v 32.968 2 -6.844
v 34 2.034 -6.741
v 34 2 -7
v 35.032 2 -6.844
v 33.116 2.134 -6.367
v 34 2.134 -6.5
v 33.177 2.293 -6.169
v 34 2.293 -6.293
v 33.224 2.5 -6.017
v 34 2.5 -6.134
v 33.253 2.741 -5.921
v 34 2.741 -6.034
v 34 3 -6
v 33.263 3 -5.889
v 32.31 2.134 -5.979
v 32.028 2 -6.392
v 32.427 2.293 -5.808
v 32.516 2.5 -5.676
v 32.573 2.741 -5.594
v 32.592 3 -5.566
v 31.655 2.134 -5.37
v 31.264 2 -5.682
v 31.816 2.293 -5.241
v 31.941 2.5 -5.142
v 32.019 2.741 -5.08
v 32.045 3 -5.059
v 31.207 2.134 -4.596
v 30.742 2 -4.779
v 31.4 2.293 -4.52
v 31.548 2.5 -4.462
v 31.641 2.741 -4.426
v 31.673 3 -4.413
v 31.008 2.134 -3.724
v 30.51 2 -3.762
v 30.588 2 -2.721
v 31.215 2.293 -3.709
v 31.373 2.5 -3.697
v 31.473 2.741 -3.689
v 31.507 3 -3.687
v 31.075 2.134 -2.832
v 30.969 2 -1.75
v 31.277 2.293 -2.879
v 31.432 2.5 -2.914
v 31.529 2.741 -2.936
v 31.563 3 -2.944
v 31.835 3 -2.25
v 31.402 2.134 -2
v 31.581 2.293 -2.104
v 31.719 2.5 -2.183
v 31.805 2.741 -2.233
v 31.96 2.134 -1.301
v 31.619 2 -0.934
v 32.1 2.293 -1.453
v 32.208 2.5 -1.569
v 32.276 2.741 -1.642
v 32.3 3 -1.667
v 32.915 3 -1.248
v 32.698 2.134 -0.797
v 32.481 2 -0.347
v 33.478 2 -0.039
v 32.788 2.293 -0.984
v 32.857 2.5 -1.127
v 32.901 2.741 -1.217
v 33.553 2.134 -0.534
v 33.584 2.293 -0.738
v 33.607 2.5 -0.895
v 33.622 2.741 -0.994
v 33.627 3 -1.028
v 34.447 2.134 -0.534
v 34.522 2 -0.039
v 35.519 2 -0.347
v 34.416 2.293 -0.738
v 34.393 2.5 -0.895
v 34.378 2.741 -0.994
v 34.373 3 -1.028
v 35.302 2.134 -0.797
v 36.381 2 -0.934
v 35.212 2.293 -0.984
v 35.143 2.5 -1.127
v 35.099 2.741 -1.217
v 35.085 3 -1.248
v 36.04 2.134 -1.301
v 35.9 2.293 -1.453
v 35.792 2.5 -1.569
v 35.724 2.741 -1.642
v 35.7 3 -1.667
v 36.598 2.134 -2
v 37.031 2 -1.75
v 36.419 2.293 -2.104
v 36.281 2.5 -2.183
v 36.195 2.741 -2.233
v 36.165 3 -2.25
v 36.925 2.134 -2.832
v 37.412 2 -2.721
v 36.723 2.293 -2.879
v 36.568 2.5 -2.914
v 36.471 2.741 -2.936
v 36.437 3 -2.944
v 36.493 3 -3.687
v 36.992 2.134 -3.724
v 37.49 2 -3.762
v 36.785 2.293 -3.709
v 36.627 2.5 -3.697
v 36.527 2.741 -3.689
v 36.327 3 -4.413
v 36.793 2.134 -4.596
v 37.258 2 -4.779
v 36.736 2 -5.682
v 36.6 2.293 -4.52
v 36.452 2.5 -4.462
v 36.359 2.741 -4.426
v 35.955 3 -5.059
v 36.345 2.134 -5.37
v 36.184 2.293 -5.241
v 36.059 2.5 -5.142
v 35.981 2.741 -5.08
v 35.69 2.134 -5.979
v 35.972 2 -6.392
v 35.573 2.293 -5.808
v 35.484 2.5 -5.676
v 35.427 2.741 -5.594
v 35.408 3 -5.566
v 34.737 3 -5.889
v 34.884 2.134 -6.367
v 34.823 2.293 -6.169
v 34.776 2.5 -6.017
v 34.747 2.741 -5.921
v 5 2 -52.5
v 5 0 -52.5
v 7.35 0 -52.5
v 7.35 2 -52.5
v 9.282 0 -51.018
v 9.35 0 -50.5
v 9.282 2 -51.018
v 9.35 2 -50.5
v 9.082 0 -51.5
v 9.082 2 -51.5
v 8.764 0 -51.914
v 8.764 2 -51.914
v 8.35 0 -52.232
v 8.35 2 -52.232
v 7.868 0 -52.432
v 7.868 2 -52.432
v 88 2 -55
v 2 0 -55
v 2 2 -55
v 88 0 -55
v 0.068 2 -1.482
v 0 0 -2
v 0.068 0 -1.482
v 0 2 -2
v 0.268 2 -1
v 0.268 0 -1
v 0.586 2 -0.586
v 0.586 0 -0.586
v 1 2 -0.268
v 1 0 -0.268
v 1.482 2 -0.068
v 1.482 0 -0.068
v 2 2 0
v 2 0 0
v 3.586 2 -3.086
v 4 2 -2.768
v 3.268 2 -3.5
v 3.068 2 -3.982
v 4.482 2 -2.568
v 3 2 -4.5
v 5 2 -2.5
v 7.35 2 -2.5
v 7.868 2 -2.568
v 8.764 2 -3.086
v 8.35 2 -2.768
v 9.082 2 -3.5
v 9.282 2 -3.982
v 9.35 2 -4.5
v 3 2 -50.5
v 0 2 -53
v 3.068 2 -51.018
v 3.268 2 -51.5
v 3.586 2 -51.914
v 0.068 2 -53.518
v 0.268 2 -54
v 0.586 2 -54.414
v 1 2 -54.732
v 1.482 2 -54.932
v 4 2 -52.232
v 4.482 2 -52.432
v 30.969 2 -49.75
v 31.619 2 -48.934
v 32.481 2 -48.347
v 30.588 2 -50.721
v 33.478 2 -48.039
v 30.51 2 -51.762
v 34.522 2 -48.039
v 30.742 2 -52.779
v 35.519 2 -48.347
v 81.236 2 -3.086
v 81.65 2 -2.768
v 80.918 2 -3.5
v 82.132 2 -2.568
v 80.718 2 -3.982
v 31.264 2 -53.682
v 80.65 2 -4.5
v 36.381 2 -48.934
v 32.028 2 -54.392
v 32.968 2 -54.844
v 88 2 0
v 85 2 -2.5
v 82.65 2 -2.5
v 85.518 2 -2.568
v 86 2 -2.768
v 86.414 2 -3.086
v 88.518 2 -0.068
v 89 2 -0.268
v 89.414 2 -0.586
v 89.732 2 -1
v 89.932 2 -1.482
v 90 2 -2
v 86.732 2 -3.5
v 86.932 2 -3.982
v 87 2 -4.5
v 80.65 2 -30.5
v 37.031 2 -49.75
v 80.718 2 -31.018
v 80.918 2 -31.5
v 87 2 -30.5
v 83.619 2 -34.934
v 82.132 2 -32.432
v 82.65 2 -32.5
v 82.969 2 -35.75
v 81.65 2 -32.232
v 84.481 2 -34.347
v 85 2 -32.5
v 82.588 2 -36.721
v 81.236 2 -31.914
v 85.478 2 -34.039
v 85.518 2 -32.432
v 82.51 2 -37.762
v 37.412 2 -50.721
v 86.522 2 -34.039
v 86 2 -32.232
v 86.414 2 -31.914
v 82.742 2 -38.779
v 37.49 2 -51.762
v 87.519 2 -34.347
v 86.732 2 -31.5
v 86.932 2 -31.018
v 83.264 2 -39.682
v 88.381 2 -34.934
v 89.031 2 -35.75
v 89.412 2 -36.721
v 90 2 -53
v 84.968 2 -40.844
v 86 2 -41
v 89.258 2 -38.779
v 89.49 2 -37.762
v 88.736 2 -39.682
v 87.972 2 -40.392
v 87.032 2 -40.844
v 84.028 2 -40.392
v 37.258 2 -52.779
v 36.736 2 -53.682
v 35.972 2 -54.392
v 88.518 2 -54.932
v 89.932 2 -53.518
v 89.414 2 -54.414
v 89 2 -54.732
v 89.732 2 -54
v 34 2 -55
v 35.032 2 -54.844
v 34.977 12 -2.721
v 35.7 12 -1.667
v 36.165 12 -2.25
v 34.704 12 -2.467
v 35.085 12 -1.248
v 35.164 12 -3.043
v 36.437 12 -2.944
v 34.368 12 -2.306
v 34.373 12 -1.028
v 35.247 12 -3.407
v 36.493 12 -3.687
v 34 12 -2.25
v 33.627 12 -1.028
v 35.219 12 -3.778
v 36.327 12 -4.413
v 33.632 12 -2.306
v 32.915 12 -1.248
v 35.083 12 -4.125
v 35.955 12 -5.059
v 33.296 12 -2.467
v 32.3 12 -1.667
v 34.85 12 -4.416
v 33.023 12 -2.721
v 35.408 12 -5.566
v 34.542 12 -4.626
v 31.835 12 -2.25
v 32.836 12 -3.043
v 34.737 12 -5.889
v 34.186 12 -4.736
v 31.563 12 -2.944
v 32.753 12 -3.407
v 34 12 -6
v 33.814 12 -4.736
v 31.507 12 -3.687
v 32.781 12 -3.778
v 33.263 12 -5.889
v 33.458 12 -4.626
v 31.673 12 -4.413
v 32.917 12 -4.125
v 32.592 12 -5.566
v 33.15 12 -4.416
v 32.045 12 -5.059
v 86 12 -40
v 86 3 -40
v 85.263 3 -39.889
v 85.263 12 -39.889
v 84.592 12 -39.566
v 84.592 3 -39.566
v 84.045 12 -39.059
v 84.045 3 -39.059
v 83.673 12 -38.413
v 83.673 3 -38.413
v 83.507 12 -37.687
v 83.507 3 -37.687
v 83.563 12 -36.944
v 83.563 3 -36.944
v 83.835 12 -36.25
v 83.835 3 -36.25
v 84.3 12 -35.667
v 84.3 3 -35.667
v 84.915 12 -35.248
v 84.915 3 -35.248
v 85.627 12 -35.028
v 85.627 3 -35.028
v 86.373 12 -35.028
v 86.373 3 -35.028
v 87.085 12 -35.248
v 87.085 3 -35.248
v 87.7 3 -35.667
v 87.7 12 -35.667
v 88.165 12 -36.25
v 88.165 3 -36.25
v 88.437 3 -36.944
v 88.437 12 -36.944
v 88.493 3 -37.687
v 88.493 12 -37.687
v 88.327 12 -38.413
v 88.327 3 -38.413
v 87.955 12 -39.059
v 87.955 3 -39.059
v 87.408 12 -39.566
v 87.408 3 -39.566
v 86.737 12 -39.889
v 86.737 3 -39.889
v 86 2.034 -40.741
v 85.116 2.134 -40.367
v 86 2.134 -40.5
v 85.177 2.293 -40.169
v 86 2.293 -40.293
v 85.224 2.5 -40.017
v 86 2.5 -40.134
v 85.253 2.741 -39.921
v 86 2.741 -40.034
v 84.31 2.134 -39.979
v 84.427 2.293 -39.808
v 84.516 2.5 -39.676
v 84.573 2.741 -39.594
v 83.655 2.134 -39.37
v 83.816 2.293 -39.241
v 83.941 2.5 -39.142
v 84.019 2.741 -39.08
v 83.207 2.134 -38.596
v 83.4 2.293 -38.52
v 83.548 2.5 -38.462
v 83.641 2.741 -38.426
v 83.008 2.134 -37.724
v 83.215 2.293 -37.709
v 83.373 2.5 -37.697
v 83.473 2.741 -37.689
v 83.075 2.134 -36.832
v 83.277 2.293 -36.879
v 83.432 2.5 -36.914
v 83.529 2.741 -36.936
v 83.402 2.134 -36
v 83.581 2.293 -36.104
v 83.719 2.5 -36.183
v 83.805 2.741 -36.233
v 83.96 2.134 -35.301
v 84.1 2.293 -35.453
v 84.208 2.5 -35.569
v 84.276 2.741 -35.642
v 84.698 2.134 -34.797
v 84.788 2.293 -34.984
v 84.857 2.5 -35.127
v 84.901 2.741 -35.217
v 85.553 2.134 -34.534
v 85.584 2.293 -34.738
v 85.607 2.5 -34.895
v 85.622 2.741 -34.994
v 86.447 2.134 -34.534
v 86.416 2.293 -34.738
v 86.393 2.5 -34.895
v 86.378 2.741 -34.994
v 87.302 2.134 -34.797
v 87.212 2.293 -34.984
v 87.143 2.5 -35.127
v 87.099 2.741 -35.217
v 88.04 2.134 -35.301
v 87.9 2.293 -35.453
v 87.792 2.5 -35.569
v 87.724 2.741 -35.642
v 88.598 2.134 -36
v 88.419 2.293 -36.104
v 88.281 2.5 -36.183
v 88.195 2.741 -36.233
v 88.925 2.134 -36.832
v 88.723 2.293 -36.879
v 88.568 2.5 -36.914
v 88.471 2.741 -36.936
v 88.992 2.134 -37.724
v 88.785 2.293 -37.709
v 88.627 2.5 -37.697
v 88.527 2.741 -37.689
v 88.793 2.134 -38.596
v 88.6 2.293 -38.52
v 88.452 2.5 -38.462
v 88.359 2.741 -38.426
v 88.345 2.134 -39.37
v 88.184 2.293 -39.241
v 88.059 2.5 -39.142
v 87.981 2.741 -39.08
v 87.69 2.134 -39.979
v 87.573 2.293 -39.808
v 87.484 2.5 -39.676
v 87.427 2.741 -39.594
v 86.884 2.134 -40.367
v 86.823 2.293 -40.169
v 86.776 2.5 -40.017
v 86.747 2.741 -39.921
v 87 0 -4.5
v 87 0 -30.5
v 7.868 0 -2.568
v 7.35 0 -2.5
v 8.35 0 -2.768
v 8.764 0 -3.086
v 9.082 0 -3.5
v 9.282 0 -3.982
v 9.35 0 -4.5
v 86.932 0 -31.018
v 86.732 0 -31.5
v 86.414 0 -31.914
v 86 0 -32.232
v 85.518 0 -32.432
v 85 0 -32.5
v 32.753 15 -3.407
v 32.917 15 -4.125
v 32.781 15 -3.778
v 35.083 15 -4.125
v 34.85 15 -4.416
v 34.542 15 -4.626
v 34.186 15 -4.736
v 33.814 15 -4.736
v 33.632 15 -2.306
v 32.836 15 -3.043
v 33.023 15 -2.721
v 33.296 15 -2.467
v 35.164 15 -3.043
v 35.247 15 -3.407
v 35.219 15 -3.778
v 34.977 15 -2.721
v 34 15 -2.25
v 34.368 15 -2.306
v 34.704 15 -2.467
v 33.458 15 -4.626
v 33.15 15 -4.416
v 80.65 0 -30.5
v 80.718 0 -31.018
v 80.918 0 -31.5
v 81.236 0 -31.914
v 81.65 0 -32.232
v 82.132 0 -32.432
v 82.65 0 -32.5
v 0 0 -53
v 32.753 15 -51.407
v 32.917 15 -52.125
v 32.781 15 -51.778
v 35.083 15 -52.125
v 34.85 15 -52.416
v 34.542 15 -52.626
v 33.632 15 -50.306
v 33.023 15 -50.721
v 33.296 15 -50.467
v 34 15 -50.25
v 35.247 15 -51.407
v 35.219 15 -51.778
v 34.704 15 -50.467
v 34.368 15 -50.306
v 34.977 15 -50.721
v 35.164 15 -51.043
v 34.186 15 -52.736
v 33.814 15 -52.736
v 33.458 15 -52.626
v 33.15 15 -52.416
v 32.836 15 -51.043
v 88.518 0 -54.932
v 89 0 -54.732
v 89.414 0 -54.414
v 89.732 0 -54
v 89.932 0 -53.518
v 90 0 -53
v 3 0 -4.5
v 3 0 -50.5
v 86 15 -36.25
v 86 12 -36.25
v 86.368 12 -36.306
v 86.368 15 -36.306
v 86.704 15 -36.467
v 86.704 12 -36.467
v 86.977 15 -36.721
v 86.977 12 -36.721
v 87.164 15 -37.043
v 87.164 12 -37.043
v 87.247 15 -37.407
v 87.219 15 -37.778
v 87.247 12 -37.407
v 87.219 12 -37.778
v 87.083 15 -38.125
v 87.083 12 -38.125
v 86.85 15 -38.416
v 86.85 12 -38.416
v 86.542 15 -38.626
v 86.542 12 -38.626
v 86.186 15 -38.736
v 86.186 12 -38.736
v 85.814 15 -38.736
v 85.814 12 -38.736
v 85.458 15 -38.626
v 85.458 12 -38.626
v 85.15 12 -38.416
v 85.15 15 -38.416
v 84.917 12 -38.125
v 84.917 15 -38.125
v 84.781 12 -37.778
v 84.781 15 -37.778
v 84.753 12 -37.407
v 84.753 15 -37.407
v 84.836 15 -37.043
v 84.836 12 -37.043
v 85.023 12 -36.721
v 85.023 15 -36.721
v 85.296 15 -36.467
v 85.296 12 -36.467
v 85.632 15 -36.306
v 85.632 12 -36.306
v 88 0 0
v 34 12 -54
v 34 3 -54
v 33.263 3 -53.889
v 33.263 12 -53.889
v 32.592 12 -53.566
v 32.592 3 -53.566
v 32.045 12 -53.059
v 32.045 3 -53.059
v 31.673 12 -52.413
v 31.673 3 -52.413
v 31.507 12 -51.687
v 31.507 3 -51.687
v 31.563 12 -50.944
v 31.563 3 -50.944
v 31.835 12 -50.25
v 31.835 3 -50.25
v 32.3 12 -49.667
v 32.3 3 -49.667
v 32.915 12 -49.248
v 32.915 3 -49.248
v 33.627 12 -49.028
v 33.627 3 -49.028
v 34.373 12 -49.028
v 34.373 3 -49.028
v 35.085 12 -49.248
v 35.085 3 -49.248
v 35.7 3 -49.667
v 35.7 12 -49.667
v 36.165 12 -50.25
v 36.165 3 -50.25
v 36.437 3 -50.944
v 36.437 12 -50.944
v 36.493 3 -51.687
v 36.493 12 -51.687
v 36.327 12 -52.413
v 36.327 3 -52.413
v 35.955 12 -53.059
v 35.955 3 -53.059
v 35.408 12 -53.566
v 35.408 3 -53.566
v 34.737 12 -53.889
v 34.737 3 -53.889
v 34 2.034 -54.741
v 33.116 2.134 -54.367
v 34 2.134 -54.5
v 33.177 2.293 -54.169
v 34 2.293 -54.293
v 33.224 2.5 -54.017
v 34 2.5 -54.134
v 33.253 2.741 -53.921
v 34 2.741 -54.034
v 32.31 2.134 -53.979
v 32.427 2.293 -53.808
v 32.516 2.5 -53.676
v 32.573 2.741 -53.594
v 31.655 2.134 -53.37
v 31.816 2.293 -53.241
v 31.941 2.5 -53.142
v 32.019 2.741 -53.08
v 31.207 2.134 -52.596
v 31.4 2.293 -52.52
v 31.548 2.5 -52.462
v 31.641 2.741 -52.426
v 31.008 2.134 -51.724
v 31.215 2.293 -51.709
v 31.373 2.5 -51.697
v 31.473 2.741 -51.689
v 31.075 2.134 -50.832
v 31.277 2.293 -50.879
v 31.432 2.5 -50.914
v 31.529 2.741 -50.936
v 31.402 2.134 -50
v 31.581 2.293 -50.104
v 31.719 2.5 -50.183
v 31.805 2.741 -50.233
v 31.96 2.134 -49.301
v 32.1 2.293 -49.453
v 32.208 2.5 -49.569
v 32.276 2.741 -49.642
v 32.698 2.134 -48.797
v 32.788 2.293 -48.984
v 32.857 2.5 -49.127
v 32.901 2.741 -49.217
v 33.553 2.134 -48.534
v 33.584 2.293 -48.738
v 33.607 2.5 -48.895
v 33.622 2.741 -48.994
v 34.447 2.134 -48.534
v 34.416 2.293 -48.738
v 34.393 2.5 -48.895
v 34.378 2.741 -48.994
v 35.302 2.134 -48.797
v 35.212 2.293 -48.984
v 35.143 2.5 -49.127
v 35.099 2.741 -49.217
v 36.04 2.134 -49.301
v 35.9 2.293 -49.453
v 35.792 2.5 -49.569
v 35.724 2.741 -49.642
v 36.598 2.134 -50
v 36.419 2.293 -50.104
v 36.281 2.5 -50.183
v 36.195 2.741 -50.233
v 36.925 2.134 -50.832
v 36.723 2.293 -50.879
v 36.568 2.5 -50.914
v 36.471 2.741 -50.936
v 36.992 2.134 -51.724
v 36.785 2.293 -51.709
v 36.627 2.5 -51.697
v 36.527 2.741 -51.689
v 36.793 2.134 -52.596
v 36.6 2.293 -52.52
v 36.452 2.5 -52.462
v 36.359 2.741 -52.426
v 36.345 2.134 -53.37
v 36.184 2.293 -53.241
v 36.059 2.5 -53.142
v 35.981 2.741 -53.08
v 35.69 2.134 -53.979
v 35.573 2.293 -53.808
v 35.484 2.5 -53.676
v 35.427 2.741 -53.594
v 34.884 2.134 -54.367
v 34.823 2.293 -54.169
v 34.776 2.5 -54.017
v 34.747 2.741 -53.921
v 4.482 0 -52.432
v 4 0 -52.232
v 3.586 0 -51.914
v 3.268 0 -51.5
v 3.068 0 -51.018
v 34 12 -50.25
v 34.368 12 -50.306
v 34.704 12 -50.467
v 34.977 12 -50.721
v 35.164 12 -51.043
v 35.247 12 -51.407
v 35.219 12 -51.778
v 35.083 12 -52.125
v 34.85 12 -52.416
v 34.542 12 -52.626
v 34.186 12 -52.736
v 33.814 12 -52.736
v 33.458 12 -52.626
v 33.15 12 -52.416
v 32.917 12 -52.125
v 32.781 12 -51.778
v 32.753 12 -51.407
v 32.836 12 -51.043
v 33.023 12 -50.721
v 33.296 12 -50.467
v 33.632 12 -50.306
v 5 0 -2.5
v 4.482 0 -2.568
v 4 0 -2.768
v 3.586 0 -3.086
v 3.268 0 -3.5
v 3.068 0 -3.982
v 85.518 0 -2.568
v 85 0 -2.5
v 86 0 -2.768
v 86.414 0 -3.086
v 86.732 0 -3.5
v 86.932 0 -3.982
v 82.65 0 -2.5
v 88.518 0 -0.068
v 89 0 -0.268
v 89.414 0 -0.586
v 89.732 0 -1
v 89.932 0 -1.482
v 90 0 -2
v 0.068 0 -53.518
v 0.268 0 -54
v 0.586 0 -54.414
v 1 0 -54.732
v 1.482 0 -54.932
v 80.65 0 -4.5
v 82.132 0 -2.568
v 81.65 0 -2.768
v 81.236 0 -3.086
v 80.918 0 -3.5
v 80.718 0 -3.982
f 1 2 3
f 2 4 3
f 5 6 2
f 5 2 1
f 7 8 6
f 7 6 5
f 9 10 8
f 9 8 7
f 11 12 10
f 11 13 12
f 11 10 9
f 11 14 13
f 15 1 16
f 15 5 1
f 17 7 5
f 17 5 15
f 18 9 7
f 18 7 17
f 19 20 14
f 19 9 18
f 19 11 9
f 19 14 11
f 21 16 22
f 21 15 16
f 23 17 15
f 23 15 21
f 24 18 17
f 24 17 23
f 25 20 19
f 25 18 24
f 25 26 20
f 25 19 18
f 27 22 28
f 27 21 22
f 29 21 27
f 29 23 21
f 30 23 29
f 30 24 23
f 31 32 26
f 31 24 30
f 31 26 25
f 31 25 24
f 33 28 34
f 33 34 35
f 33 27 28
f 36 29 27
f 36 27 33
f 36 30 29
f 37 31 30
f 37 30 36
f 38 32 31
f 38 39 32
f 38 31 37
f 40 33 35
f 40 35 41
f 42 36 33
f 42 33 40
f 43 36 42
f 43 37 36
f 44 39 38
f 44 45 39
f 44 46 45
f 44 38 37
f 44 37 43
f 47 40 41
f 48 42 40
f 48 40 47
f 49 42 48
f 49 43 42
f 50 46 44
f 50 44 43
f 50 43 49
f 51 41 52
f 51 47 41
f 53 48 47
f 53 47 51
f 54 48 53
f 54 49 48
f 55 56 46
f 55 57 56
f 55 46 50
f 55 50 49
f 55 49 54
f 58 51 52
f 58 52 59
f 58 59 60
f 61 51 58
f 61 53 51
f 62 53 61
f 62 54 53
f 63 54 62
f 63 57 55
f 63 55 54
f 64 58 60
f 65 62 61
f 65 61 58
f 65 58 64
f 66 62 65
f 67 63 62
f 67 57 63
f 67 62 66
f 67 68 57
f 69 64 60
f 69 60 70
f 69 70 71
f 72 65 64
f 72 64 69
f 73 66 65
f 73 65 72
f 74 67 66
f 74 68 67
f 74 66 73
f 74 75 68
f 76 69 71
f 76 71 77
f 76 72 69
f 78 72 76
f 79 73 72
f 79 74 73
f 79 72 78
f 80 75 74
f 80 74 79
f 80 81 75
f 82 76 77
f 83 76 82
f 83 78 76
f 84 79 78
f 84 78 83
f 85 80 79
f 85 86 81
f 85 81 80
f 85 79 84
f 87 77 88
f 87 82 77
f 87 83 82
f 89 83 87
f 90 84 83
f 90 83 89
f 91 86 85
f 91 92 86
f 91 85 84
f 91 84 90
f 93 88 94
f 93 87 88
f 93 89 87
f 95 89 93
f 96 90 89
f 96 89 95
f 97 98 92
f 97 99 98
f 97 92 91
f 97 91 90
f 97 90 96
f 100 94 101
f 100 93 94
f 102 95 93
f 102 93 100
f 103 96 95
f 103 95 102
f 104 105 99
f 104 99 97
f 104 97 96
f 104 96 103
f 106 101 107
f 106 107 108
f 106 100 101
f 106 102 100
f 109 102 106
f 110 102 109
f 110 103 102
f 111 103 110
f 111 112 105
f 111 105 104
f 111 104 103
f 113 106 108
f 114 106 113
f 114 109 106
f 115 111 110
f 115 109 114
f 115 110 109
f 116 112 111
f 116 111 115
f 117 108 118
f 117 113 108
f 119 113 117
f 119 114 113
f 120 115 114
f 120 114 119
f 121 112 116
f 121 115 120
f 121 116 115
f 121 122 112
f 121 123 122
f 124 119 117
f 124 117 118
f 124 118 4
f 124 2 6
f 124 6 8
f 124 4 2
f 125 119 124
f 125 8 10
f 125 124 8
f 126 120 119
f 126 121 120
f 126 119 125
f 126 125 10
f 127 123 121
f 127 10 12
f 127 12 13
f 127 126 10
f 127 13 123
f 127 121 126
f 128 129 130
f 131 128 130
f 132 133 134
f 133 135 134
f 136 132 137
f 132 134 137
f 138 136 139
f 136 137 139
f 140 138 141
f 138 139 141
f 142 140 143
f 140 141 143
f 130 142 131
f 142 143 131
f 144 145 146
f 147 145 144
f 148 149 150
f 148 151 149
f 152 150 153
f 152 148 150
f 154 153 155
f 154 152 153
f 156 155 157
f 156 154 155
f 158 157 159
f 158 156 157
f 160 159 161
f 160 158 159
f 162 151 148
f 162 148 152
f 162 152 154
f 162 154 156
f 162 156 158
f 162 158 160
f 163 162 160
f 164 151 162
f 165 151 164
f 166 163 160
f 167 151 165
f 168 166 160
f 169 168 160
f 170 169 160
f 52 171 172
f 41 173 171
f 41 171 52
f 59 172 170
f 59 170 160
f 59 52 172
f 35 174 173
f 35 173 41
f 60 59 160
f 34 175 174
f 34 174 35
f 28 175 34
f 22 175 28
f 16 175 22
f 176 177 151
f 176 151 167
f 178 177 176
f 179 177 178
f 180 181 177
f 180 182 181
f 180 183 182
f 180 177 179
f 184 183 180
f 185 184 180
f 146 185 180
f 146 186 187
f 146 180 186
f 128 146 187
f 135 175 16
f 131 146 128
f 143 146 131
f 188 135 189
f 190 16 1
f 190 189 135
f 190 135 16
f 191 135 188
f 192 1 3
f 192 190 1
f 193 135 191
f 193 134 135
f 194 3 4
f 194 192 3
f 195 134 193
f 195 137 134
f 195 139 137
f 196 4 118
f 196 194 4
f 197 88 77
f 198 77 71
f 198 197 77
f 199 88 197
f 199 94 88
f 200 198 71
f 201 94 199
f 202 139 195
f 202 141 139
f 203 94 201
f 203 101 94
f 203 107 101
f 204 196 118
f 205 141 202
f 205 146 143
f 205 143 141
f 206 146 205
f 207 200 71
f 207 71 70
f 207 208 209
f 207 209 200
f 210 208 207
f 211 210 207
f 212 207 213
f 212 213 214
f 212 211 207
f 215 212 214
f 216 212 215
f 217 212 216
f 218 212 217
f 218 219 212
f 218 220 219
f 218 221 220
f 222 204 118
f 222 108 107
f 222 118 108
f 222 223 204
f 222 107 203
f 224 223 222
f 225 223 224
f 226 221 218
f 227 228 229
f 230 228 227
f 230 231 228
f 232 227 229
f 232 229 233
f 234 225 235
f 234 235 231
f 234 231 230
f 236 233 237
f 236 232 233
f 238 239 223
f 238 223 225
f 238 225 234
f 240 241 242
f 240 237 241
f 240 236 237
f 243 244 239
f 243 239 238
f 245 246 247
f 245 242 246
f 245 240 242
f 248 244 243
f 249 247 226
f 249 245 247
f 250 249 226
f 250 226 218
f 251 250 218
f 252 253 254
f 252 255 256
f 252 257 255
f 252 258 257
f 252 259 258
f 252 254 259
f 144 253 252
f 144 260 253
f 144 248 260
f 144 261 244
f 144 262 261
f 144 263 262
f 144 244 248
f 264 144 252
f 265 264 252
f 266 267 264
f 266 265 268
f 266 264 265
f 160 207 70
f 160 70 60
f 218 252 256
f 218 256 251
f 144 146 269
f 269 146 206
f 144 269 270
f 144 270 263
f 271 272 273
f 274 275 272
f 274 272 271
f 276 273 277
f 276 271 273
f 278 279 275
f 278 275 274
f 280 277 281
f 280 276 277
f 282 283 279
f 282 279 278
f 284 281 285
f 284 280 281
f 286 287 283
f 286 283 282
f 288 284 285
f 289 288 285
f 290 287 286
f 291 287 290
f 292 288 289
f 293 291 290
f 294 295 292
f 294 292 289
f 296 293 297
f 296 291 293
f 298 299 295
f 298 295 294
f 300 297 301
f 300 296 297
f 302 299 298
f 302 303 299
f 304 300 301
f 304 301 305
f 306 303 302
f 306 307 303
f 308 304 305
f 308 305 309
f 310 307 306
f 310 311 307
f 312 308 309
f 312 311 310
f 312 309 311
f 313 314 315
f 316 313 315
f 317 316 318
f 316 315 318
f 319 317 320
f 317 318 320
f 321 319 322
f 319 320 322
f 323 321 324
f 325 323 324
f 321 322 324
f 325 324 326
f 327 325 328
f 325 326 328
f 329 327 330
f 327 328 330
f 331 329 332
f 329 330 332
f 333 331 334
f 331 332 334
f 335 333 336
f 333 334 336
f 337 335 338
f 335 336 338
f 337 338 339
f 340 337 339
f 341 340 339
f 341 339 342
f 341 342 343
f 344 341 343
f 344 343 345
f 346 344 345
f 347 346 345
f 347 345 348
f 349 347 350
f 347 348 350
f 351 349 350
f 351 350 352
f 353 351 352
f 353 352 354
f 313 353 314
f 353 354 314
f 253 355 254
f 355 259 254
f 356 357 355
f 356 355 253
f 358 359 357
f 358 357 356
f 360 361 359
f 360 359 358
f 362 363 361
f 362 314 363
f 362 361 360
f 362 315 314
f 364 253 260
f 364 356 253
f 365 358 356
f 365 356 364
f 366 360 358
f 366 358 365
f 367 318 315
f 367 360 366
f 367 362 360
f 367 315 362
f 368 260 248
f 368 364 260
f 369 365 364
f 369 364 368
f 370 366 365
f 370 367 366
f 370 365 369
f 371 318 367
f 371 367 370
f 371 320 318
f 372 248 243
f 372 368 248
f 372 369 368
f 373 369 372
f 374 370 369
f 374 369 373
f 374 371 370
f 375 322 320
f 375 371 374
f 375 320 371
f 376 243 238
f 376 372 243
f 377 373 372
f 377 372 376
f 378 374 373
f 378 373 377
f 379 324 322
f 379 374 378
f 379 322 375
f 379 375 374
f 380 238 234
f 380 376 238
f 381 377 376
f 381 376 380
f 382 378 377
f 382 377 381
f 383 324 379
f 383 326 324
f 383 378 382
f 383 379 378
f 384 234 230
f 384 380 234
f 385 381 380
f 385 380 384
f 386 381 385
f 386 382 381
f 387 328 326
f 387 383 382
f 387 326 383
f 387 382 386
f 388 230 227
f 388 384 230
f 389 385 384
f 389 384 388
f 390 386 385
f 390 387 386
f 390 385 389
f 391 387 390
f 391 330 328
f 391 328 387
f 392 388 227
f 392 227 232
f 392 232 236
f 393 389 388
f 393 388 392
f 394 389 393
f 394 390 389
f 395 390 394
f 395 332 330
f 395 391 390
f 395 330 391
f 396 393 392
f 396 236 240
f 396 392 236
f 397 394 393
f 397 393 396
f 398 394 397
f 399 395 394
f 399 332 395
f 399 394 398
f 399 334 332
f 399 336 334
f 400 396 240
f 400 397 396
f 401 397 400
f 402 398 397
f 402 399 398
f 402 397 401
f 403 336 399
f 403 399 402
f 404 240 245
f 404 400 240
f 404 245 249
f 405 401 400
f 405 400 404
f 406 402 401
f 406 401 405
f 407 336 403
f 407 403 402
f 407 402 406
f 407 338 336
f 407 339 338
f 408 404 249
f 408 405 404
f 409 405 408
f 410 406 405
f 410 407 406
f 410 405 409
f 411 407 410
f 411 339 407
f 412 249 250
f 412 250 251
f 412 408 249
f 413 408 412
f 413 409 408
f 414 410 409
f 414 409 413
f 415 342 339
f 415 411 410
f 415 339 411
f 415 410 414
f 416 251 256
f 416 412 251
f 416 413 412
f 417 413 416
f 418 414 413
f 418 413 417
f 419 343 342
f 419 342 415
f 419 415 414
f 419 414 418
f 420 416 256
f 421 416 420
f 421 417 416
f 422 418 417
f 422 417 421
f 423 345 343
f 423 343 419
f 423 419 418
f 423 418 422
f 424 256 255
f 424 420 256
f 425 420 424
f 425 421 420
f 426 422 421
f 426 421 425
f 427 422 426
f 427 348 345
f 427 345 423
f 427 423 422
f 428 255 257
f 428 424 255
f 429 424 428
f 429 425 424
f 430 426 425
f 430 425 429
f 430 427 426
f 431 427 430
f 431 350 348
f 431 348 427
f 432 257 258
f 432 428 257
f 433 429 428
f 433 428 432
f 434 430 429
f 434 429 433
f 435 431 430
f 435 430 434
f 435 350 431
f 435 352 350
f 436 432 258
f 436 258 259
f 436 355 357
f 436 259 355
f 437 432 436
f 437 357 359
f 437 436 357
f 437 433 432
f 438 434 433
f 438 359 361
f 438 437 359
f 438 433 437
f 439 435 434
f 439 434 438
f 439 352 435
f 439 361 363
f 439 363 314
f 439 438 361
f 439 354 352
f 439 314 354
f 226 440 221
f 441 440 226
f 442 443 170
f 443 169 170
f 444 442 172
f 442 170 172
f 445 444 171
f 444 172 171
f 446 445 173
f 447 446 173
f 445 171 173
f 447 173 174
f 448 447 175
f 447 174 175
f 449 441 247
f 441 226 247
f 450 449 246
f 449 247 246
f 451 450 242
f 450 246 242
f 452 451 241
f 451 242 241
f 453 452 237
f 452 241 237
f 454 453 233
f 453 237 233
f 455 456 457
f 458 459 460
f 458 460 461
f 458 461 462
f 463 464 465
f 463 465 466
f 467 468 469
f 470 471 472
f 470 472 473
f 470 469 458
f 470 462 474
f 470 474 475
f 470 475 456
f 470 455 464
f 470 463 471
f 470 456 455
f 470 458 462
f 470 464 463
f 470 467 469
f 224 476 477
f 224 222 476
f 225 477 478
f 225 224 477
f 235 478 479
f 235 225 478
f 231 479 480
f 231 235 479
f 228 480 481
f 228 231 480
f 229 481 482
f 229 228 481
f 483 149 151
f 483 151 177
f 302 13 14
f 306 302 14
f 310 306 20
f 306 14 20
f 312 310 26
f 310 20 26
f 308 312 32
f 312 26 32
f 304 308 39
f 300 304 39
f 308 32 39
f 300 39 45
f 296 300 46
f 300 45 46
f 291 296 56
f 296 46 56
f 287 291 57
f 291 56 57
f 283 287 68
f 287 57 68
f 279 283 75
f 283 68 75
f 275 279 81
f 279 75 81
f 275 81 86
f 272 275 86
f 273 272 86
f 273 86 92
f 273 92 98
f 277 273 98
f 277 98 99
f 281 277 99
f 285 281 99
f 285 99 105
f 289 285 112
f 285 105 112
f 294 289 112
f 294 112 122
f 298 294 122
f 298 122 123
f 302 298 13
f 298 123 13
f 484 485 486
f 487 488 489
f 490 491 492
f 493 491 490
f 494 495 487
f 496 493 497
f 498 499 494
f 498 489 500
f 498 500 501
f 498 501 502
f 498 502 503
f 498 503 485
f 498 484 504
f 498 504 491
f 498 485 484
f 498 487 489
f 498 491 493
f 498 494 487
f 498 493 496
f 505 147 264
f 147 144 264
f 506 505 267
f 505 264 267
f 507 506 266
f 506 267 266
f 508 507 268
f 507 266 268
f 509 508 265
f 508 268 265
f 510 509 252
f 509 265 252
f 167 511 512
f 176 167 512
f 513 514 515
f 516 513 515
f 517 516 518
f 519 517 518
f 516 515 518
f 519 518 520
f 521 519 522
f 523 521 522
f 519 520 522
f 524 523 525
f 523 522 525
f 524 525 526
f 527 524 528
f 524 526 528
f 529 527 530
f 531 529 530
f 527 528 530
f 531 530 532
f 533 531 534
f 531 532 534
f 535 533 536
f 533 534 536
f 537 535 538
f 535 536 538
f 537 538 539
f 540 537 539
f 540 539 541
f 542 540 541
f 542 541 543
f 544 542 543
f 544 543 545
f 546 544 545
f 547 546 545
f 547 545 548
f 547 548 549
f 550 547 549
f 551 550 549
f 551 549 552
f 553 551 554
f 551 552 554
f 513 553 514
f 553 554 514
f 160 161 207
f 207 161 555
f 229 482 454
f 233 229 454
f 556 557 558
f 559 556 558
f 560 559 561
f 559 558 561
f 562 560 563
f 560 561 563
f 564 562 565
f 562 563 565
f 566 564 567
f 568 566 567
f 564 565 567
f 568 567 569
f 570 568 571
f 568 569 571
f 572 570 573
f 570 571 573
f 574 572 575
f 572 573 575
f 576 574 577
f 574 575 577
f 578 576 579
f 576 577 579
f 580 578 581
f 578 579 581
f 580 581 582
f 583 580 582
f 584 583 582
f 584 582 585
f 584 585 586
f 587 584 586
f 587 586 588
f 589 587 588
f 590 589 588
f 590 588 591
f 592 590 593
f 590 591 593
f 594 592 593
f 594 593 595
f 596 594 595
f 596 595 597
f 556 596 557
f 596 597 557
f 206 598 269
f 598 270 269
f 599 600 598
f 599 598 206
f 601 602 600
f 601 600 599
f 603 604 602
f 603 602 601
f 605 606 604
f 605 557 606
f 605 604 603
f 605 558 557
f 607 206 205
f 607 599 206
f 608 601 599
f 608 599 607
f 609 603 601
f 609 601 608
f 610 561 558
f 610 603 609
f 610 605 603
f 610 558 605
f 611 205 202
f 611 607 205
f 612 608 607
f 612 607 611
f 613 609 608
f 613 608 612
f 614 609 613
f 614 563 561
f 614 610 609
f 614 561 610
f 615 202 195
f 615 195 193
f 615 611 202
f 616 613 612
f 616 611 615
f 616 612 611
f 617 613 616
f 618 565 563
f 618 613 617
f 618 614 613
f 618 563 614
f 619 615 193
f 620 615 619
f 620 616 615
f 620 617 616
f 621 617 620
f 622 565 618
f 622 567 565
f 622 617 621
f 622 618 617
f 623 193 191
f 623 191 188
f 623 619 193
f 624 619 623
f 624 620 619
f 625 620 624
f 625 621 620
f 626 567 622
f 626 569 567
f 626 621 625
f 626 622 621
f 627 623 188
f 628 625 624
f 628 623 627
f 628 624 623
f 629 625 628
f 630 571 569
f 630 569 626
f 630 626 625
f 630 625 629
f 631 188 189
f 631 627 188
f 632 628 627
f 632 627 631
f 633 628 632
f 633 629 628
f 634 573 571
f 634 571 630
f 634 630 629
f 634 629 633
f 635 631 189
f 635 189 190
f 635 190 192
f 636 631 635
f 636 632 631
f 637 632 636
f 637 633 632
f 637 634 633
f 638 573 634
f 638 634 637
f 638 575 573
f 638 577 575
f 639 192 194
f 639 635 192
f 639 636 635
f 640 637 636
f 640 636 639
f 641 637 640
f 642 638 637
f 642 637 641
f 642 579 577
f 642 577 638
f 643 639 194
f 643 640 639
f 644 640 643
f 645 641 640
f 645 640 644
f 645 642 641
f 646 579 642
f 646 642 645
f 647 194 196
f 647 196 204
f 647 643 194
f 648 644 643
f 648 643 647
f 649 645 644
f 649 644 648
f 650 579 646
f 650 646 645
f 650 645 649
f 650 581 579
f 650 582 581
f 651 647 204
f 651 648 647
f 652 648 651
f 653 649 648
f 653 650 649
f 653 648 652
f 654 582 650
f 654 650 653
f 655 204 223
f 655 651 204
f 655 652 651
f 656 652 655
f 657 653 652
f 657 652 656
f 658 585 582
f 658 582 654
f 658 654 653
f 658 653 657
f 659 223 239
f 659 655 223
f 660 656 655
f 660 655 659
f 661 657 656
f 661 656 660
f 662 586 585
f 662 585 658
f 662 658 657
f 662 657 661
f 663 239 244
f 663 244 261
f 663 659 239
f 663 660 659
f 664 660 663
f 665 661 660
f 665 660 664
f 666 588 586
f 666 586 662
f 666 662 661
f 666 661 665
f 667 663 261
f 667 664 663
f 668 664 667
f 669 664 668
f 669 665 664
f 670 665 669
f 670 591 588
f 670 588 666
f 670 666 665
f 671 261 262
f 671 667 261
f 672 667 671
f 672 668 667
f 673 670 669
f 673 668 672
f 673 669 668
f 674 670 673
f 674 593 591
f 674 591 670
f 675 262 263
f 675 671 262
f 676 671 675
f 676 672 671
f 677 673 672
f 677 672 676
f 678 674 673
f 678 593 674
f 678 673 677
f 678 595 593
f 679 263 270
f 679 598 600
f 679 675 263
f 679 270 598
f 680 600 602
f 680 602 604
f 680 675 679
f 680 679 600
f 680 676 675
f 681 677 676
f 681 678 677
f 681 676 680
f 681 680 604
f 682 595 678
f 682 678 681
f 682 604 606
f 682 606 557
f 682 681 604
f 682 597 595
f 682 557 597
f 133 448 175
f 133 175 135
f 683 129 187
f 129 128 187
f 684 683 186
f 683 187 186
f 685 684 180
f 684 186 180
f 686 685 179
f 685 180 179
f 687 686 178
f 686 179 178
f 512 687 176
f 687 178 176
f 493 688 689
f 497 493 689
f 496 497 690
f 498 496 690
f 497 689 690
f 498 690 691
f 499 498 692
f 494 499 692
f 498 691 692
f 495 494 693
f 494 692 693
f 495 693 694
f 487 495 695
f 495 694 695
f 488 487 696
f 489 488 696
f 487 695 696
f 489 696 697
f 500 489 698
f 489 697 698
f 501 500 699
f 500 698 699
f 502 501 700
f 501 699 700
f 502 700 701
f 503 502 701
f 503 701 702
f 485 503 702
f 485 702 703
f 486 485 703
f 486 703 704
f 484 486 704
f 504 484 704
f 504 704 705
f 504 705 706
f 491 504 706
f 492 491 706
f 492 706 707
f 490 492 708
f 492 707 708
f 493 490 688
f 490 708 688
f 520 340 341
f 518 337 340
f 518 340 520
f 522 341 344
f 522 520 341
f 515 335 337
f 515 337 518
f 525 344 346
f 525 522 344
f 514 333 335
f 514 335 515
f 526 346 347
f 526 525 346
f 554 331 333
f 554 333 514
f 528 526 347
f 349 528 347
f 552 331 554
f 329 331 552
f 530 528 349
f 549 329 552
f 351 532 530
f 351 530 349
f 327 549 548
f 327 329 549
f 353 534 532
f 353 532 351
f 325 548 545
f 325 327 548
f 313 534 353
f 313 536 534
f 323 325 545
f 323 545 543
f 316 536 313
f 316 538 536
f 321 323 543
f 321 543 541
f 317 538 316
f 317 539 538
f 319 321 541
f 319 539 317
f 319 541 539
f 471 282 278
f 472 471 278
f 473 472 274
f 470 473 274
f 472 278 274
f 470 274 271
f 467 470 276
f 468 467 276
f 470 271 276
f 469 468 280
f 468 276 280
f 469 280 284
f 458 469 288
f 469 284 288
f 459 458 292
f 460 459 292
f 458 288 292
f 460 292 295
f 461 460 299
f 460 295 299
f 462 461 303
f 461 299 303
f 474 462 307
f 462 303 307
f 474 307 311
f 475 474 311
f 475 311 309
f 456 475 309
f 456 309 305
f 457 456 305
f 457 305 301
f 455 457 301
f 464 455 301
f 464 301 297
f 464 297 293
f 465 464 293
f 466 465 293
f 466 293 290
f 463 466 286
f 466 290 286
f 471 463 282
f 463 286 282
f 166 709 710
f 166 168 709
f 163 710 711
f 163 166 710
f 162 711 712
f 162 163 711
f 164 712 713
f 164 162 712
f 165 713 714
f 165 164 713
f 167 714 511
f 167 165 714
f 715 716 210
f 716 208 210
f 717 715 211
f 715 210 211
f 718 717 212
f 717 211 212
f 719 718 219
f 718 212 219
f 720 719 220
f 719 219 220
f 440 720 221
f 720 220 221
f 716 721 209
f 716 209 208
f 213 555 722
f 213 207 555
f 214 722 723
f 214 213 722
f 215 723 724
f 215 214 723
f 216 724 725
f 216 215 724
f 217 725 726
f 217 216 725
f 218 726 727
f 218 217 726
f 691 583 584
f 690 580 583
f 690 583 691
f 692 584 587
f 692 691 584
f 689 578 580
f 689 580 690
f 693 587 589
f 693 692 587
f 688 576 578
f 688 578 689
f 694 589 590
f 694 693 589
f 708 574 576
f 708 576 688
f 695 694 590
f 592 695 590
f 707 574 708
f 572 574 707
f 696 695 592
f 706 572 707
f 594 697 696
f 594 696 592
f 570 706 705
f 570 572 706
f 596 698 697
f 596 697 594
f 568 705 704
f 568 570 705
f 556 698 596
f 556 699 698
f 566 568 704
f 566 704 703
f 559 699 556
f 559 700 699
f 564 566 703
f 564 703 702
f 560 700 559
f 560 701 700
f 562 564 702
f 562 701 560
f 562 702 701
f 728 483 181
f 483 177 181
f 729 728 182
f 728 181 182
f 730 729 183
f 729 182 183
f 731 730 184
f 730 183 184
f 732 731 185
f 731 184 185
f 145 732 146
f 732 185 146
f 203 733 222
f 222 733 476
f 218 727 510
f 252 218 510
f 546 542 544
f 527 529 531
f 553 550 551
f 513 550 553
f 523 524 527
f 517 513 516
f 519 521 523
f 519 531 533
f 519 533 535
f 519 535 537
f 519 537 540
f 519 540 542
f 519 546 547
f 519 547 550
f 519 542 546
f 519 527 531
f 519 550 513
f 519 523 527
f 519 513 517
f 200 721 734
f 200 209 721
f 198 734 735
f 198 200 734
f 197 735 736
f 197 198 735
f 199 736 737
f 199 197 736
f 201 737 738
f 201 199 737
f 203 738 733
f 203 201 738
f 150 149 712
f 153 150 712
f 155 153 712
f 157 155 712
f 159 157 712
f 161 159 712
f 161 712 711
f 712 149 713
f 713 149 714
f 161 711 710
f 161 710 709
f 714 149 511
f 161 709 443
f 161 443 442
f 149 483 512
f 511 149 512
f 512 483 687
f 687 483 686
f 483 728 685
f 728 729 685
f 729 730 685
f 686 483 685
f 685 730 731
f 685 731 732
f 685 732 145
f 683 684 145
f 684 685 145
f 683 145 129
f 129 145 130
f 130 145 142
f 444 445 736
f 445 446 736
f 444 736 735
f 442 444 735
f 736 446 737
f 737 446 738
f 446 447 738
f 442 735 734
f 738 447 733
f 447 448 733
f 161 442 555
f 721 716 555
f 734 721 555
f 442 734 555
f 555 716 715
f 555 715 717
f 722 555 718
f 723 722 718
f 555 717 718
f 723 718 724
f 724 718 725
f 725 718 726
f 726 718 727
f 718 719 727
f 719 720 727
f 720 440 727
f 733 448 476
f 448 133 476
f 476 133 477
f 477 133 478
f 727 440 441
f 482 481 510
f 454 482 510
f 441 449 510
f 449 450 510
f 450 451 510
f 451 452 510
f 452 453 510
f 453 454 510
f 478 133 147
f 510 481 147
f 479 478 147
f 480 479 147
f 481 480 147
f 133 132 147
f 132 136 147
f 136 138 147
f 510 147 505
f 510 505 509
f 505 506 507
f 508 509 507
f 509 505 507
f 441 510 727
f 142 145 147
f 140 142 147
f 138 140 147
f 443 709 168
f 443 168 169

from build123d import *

# Parameters (mm, degrees)
SKETCH1_W           = 90
SKETCH1_H           = 55
SKETCH1_W_2         = 6.35
SKETCH1_H_2         = 30
SKETCH1_H_3         = 50
BOSS_EXTRUDE1_DEPTH = 2
SKETCH2_R           = 2.5
BOSS_EXTRUDE2_DEPTH = 10
SKETCH3_R           = 1.25
BOSS_EXTRUDE3_DEPTH = 3
FILLET1_R           = 2
FILLET2_R           = 1


with BuildPart() as part:
    # Sketch1 → Boss-Extrude1 (new body)
    with BuildSketch(Plane(origin=(0, 0, 0), x_dir=(1, 0, 0), z_dir=(0, 1, 0))):
        with Locations((45, 27.5)):
            Rectangle(SKETCH1_W, SKETCH1_H)
        with Locations((83.825, 17.5)):
            Rectangle(SKETCH1_W_2, SKETCH1_H_2, mode=Mode.SUBTRACT)
        with Locations((6.175, 27.5)):
            Rectangle(SKETCH1_W_2, SKETCH1_H_3, mode=Mode.SUBTRACT)
    extrude(amount=BOSS_EXTRUDE1_DEPTH)

    # Sketch2 → Boss-Extrude2 (add)
    with BuildSketch(Plane(origin=(0, 2, 0), x_dir=(1, 0, 0), z_dir=(0, 1, 0))):
        with Locations(Location((34, 51.5, 0), (0, 0, 90))):
            Circle(SKETCH2_R)
        with Locations(Location((34, 3.5, 0), (0, 0, 90))):
            Circle(SKETCH2_R)
        with Locations(Location((86, 37.5, 0), (0, 0, 90))):
            Circle(SKETCH2_R)
    extrude(amount=BOSS_EXTRUDE2_DEPTH)

    # Sketch3 → Boss-Extrude3 (add)
    with BuildSketch(Plane(origin=(0, 12, 0), x_dir=(1, 0, 0), z_dir=(0, 1, 0))):
        with Locations(Location((34, 51.5, 0), (0, 0, 270))):
            Circle(SKETCH3_R)
        with Locations(Location((34, 3.5, 0), (0, 0, 270))):
            Circle(SKETCH3_R)
        with Locations(Location((86, 37.5, 0), (0, 0, 270))):
            Circle(SKETCH3_R)
    extrude(amount=BOSS_EXTRUDE3_DEPTH)

    # Fillet1
    fillet1_edges = [part.edges().sort_by_distance(p)[0] for p in [
        (80.65, 1, -32.5),
        (80.65, 1, -2.5),
        (87, 1, -2.5),
        (87, 1, -32.5),
        (3, 1, -52.5),
        (3, 1, -2.5),
        (9.35, 1, -2.5),
        (9.35, 1, -52.5),
        (0, 1, -55),
        (90, 1, -55),
        (90, 1, 0),
        (0, 1, 0),
    ]]
    fillet(fillet1_edges, radius=FILLET1_R)

    # Fillet2
    fillet2_edges = [part.edges().sort_by_distance(p)[0] for p in [
        (86, 2, -35),
        (34, 2, -1),
        (34, 2, -49),
    ]]
    fillet(fillet2_edges, radius=FILLET2_R - 0.0001)  # a hair under: the kernel refuses the full size


solid = part.part
